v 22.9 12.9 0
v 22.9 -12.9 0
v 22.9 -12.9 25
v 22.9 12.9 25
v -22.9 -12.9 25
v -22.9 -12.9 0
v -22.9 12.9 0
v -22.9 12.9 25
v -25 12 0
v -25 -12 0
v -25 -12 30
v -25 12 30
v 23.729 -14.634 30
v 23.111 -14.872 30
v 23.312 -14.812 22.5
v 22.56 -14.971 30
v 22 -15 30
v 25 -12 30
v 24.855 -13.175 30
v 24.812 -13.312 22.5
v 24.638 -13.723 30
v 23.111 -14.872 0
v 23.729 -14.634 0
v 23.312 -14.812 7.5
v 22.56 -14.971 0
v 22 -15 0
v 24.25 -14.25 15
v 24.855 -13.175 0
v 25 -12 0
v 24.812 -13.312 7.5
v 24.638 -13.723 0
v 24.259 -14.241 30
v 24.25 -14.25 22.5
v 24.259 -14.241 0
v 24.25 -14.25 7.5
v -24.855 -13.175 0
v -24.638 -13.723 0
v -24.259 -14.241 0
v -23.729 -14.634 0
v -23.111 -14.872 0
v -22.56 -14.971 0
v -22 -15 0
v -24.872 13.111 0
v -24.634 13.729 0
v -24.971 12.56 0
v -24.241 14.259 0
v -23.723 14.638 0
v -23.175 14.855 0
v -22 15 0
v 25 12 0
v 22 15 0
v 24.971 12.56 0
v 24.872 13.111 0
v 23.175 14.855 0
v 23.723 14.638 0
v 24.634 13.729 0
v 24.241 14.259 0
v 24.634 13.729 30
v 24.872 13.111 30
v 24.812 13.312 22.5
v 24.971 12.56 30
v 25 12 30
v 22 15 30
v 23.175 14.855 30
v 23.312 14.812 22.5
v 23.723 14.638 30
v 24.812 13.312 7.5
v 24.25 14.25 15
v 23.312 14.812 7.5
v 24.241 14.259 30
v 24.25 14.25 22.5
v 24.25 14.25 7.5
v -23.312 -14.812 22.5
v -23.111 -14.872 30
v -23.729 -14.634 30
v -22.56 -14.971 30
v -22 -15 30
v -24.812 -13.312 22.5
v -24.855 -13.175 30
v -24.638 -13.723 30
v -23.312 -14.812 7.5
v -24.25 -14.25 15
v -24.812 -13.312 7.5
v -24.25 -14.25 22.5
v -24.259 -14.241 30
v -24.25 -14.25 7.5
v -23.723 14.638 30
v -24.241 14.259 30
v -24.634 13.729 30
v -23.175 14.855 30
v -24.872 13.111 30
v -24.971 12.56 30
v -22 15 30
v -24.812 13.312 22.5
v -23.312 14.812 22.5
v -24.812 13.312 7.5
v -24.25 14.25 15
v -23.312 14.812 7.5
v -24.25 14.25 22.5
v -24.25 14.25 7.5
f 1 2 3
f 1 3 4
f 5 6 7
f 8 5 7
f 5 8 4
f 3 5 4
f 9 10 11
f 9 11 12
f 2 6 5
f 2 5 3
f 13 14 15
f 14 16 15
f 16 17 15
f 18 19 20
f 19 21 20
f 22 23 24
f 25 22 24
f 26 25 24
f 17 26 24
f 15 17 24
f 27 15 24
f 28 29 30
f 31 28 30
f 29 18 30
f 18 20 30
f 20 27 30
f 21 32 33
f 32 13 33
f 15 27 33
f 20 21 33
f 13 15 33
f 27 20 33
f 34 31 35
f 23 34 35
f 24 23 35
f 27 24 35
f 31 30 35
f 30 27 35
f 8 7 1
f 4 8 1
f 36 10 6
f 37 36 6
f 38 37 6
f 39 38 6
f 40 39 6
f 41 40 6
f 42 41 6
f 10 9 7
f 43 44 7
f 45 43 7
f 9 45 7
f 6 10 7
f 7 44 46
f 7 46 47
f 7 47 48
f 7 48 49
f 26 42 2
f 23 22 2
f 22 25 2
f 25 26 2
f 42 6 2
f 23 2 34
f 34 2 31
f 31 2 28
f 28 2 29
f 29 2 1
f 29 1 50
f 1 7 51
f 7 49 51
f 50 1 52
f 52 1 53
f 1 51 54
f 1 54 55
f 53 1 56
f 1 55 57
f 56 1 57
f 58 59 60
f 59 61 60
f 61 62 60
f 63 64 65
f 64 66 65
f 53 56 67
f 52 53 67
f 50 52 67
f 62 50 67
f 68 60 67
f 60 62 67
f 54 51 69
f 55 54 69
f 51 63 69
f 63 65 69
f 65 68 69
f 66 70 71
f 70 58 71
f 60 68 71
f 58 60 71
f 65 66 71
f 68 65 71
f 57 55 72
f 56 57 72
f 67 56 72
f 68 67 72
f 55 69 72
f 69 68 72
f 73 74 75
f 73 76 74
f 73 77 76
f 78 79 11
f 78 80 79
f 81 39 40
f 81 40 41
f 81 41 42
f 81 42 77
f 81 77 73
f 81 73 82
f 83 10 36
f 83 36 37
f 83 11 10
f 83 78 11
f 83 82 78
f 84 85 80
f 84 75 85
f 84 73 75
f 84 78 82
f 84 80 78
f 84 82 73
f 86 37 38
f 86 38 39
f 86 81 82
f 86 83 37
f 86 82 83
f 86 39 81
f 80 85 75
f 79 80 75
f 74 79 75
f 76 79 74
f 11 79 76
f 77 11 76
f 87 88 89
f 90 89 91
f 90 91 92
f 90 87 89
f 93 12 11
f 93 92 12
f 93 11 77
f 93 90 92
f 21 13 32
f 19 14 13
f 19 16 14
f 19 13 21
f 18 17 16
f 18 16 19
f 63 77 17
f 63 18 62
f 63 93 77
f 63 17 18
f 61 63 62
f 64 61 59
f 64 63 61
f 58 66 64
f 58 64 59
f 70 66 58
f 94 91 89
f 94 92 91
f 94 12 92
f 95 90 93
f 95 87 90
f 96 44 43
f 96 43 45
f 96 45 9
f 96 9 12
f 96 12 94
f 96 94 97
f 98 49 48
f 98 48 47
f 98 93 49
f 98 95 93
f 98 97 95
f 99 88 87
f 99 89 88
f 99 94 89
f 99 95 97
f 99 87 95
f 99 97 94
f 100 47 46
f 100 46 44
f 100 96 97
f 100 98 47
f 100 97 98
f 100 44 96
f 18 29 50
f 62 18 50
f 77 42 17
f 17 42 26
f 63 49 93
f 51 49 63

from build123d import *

# Parameters (mm, degrees)
F0_W        = 49.9999988824
F0_H        = 29.9999988824
F0_W_2      = 45.8000008941
F0_H_2      = 25.8000008941
F0_W_3      = 45.0000008941
F0_H_3      = 25.0000008941
F0_W_4      = 40
F0_H_4      = 20
F1_DEPTH    = 30
F2_DEPTH    = 25
F3_T1_DEPTH = 45


# Not quite as in the source:
# - a fillet or chamfer that OpenCascade refuses, or shapes differently, is made with other operations: its cross-section is extruded or revolved along the edge and cut away or added


with BuildPart() as f1:
    # F0 (on Top) → F1 (new body)
    with BuildSketch(Plane.XY):
        Rectangle(F0_W, F0_H)
        Rectangle(F0_W_2, F0_H_2, mode=Mode.SUBTRACT)
        Rectangle(F0_W_2, F0_H_2)
        Rectangle(F0_W_3, F0_H_3, mode=Mode.SUBTRACT)
        Rectangle(F0_W_3, F0_H_3)
        Rectangle(F0_W_4, F0_H_4, mode=Mode.SUBTRACT)
        Rectangle(F0_W_4, F0_H_4)
    extrude(amount=F1_DEPTH)

    # F0 (on Top) → F2 (cut)
    with BuildSketch(Plane.XY):
        Rectangle(F0_W_2, F0_H_2)
        Rectangle(F0_W_3, F0_H_3, mode=Mode.SUBTRACT)
        Rectangle(F0_W_3, F0_H_3)
        Rectangle(F0_W_4, F0_H_4, mode=Mode.SUBTRACT)
        Rectangle(F0_W_4, F0_H_4)
    extrude(amount=F2_DEPTH, mode=Mode.SUBTRACT)

    # F3: fillet of radius 3 on 4 edges, made by hand

    # F3_s2 → F3_t1 (cut)
    with BuildSketch(Plane.XY.offset(-7.5)):
        with BuildLine():
            add(Edge.make_bspline(
                [(-21.9999994412, -14.9999994412), (-24.9999994412, -14.9999994412), (-24.9999994412, -11.9999994412)],
                knots=[0, 0, 0, 1, 1, 1], degree=2, weights=[1, 1, 1]))
            Line((-24.9999994412, -11.9999994412), (-24.9999994412, -14.9999994412))
            Line((-24.9999994412, -14.9999994412), (-21.9999994412, -14.9999994412))
        make_face()
        with BuildLine():
            add(Edge.make_bspline(
                [(-24.9999994412, 11.9999994412), (-24.9999994412, 14.9999994412), (-21.9999994412, 14.9999994412)],
                knots=[0, 0, 0, 1, 1, 1], degree=2, weights=[1, 1, 1]))
            Line((-21.9999994412, 14.9999994412), (-24.9999994412, 14.9999994412))
            Line((-24.9999994412, 14.9999994412), (-24.9999994412, 11.9999994412))
        make_face()
        with BuildLine():
            add(Edge.make_bspline(
                [(21.9999994412, -14.9999994412), (24.9999994412, -14.9999994412), (24.9999994412, -11.9999994412)],
                knots=[0, 0, 0, 1, 1, 1], degree=2, weights=[1, 1, 1]))
            Line((24.9999994412, -11.9999994412), (24.9999994412, -14.9999994412))
            Line((24.9999994412, -14.9999994412), (21.9999994412, -14.9999994412))
        make_face()
        with BuildLine():
            add(Edge.make_bspline(
                [(24.9999994412, 11.9999994412), (24.9999994412, 14.9999994412), (21.9999994412, 14.9999994412)],
                knots=[0, 0, 0, 1, 1, 1], degree=2, weights=[1, 1, 1]))
            Line((21.9999994412, 14.9999994412), (24.9999994412, 14.9999994412))
            Line((24.9999994412, 14.9999994412), (24.9999994412, 11.9999994412))
        make_face()
    extrude(amount=F3_T1_DEPTH, mode=Mode.SUBTRACT)


solid = f1.part
